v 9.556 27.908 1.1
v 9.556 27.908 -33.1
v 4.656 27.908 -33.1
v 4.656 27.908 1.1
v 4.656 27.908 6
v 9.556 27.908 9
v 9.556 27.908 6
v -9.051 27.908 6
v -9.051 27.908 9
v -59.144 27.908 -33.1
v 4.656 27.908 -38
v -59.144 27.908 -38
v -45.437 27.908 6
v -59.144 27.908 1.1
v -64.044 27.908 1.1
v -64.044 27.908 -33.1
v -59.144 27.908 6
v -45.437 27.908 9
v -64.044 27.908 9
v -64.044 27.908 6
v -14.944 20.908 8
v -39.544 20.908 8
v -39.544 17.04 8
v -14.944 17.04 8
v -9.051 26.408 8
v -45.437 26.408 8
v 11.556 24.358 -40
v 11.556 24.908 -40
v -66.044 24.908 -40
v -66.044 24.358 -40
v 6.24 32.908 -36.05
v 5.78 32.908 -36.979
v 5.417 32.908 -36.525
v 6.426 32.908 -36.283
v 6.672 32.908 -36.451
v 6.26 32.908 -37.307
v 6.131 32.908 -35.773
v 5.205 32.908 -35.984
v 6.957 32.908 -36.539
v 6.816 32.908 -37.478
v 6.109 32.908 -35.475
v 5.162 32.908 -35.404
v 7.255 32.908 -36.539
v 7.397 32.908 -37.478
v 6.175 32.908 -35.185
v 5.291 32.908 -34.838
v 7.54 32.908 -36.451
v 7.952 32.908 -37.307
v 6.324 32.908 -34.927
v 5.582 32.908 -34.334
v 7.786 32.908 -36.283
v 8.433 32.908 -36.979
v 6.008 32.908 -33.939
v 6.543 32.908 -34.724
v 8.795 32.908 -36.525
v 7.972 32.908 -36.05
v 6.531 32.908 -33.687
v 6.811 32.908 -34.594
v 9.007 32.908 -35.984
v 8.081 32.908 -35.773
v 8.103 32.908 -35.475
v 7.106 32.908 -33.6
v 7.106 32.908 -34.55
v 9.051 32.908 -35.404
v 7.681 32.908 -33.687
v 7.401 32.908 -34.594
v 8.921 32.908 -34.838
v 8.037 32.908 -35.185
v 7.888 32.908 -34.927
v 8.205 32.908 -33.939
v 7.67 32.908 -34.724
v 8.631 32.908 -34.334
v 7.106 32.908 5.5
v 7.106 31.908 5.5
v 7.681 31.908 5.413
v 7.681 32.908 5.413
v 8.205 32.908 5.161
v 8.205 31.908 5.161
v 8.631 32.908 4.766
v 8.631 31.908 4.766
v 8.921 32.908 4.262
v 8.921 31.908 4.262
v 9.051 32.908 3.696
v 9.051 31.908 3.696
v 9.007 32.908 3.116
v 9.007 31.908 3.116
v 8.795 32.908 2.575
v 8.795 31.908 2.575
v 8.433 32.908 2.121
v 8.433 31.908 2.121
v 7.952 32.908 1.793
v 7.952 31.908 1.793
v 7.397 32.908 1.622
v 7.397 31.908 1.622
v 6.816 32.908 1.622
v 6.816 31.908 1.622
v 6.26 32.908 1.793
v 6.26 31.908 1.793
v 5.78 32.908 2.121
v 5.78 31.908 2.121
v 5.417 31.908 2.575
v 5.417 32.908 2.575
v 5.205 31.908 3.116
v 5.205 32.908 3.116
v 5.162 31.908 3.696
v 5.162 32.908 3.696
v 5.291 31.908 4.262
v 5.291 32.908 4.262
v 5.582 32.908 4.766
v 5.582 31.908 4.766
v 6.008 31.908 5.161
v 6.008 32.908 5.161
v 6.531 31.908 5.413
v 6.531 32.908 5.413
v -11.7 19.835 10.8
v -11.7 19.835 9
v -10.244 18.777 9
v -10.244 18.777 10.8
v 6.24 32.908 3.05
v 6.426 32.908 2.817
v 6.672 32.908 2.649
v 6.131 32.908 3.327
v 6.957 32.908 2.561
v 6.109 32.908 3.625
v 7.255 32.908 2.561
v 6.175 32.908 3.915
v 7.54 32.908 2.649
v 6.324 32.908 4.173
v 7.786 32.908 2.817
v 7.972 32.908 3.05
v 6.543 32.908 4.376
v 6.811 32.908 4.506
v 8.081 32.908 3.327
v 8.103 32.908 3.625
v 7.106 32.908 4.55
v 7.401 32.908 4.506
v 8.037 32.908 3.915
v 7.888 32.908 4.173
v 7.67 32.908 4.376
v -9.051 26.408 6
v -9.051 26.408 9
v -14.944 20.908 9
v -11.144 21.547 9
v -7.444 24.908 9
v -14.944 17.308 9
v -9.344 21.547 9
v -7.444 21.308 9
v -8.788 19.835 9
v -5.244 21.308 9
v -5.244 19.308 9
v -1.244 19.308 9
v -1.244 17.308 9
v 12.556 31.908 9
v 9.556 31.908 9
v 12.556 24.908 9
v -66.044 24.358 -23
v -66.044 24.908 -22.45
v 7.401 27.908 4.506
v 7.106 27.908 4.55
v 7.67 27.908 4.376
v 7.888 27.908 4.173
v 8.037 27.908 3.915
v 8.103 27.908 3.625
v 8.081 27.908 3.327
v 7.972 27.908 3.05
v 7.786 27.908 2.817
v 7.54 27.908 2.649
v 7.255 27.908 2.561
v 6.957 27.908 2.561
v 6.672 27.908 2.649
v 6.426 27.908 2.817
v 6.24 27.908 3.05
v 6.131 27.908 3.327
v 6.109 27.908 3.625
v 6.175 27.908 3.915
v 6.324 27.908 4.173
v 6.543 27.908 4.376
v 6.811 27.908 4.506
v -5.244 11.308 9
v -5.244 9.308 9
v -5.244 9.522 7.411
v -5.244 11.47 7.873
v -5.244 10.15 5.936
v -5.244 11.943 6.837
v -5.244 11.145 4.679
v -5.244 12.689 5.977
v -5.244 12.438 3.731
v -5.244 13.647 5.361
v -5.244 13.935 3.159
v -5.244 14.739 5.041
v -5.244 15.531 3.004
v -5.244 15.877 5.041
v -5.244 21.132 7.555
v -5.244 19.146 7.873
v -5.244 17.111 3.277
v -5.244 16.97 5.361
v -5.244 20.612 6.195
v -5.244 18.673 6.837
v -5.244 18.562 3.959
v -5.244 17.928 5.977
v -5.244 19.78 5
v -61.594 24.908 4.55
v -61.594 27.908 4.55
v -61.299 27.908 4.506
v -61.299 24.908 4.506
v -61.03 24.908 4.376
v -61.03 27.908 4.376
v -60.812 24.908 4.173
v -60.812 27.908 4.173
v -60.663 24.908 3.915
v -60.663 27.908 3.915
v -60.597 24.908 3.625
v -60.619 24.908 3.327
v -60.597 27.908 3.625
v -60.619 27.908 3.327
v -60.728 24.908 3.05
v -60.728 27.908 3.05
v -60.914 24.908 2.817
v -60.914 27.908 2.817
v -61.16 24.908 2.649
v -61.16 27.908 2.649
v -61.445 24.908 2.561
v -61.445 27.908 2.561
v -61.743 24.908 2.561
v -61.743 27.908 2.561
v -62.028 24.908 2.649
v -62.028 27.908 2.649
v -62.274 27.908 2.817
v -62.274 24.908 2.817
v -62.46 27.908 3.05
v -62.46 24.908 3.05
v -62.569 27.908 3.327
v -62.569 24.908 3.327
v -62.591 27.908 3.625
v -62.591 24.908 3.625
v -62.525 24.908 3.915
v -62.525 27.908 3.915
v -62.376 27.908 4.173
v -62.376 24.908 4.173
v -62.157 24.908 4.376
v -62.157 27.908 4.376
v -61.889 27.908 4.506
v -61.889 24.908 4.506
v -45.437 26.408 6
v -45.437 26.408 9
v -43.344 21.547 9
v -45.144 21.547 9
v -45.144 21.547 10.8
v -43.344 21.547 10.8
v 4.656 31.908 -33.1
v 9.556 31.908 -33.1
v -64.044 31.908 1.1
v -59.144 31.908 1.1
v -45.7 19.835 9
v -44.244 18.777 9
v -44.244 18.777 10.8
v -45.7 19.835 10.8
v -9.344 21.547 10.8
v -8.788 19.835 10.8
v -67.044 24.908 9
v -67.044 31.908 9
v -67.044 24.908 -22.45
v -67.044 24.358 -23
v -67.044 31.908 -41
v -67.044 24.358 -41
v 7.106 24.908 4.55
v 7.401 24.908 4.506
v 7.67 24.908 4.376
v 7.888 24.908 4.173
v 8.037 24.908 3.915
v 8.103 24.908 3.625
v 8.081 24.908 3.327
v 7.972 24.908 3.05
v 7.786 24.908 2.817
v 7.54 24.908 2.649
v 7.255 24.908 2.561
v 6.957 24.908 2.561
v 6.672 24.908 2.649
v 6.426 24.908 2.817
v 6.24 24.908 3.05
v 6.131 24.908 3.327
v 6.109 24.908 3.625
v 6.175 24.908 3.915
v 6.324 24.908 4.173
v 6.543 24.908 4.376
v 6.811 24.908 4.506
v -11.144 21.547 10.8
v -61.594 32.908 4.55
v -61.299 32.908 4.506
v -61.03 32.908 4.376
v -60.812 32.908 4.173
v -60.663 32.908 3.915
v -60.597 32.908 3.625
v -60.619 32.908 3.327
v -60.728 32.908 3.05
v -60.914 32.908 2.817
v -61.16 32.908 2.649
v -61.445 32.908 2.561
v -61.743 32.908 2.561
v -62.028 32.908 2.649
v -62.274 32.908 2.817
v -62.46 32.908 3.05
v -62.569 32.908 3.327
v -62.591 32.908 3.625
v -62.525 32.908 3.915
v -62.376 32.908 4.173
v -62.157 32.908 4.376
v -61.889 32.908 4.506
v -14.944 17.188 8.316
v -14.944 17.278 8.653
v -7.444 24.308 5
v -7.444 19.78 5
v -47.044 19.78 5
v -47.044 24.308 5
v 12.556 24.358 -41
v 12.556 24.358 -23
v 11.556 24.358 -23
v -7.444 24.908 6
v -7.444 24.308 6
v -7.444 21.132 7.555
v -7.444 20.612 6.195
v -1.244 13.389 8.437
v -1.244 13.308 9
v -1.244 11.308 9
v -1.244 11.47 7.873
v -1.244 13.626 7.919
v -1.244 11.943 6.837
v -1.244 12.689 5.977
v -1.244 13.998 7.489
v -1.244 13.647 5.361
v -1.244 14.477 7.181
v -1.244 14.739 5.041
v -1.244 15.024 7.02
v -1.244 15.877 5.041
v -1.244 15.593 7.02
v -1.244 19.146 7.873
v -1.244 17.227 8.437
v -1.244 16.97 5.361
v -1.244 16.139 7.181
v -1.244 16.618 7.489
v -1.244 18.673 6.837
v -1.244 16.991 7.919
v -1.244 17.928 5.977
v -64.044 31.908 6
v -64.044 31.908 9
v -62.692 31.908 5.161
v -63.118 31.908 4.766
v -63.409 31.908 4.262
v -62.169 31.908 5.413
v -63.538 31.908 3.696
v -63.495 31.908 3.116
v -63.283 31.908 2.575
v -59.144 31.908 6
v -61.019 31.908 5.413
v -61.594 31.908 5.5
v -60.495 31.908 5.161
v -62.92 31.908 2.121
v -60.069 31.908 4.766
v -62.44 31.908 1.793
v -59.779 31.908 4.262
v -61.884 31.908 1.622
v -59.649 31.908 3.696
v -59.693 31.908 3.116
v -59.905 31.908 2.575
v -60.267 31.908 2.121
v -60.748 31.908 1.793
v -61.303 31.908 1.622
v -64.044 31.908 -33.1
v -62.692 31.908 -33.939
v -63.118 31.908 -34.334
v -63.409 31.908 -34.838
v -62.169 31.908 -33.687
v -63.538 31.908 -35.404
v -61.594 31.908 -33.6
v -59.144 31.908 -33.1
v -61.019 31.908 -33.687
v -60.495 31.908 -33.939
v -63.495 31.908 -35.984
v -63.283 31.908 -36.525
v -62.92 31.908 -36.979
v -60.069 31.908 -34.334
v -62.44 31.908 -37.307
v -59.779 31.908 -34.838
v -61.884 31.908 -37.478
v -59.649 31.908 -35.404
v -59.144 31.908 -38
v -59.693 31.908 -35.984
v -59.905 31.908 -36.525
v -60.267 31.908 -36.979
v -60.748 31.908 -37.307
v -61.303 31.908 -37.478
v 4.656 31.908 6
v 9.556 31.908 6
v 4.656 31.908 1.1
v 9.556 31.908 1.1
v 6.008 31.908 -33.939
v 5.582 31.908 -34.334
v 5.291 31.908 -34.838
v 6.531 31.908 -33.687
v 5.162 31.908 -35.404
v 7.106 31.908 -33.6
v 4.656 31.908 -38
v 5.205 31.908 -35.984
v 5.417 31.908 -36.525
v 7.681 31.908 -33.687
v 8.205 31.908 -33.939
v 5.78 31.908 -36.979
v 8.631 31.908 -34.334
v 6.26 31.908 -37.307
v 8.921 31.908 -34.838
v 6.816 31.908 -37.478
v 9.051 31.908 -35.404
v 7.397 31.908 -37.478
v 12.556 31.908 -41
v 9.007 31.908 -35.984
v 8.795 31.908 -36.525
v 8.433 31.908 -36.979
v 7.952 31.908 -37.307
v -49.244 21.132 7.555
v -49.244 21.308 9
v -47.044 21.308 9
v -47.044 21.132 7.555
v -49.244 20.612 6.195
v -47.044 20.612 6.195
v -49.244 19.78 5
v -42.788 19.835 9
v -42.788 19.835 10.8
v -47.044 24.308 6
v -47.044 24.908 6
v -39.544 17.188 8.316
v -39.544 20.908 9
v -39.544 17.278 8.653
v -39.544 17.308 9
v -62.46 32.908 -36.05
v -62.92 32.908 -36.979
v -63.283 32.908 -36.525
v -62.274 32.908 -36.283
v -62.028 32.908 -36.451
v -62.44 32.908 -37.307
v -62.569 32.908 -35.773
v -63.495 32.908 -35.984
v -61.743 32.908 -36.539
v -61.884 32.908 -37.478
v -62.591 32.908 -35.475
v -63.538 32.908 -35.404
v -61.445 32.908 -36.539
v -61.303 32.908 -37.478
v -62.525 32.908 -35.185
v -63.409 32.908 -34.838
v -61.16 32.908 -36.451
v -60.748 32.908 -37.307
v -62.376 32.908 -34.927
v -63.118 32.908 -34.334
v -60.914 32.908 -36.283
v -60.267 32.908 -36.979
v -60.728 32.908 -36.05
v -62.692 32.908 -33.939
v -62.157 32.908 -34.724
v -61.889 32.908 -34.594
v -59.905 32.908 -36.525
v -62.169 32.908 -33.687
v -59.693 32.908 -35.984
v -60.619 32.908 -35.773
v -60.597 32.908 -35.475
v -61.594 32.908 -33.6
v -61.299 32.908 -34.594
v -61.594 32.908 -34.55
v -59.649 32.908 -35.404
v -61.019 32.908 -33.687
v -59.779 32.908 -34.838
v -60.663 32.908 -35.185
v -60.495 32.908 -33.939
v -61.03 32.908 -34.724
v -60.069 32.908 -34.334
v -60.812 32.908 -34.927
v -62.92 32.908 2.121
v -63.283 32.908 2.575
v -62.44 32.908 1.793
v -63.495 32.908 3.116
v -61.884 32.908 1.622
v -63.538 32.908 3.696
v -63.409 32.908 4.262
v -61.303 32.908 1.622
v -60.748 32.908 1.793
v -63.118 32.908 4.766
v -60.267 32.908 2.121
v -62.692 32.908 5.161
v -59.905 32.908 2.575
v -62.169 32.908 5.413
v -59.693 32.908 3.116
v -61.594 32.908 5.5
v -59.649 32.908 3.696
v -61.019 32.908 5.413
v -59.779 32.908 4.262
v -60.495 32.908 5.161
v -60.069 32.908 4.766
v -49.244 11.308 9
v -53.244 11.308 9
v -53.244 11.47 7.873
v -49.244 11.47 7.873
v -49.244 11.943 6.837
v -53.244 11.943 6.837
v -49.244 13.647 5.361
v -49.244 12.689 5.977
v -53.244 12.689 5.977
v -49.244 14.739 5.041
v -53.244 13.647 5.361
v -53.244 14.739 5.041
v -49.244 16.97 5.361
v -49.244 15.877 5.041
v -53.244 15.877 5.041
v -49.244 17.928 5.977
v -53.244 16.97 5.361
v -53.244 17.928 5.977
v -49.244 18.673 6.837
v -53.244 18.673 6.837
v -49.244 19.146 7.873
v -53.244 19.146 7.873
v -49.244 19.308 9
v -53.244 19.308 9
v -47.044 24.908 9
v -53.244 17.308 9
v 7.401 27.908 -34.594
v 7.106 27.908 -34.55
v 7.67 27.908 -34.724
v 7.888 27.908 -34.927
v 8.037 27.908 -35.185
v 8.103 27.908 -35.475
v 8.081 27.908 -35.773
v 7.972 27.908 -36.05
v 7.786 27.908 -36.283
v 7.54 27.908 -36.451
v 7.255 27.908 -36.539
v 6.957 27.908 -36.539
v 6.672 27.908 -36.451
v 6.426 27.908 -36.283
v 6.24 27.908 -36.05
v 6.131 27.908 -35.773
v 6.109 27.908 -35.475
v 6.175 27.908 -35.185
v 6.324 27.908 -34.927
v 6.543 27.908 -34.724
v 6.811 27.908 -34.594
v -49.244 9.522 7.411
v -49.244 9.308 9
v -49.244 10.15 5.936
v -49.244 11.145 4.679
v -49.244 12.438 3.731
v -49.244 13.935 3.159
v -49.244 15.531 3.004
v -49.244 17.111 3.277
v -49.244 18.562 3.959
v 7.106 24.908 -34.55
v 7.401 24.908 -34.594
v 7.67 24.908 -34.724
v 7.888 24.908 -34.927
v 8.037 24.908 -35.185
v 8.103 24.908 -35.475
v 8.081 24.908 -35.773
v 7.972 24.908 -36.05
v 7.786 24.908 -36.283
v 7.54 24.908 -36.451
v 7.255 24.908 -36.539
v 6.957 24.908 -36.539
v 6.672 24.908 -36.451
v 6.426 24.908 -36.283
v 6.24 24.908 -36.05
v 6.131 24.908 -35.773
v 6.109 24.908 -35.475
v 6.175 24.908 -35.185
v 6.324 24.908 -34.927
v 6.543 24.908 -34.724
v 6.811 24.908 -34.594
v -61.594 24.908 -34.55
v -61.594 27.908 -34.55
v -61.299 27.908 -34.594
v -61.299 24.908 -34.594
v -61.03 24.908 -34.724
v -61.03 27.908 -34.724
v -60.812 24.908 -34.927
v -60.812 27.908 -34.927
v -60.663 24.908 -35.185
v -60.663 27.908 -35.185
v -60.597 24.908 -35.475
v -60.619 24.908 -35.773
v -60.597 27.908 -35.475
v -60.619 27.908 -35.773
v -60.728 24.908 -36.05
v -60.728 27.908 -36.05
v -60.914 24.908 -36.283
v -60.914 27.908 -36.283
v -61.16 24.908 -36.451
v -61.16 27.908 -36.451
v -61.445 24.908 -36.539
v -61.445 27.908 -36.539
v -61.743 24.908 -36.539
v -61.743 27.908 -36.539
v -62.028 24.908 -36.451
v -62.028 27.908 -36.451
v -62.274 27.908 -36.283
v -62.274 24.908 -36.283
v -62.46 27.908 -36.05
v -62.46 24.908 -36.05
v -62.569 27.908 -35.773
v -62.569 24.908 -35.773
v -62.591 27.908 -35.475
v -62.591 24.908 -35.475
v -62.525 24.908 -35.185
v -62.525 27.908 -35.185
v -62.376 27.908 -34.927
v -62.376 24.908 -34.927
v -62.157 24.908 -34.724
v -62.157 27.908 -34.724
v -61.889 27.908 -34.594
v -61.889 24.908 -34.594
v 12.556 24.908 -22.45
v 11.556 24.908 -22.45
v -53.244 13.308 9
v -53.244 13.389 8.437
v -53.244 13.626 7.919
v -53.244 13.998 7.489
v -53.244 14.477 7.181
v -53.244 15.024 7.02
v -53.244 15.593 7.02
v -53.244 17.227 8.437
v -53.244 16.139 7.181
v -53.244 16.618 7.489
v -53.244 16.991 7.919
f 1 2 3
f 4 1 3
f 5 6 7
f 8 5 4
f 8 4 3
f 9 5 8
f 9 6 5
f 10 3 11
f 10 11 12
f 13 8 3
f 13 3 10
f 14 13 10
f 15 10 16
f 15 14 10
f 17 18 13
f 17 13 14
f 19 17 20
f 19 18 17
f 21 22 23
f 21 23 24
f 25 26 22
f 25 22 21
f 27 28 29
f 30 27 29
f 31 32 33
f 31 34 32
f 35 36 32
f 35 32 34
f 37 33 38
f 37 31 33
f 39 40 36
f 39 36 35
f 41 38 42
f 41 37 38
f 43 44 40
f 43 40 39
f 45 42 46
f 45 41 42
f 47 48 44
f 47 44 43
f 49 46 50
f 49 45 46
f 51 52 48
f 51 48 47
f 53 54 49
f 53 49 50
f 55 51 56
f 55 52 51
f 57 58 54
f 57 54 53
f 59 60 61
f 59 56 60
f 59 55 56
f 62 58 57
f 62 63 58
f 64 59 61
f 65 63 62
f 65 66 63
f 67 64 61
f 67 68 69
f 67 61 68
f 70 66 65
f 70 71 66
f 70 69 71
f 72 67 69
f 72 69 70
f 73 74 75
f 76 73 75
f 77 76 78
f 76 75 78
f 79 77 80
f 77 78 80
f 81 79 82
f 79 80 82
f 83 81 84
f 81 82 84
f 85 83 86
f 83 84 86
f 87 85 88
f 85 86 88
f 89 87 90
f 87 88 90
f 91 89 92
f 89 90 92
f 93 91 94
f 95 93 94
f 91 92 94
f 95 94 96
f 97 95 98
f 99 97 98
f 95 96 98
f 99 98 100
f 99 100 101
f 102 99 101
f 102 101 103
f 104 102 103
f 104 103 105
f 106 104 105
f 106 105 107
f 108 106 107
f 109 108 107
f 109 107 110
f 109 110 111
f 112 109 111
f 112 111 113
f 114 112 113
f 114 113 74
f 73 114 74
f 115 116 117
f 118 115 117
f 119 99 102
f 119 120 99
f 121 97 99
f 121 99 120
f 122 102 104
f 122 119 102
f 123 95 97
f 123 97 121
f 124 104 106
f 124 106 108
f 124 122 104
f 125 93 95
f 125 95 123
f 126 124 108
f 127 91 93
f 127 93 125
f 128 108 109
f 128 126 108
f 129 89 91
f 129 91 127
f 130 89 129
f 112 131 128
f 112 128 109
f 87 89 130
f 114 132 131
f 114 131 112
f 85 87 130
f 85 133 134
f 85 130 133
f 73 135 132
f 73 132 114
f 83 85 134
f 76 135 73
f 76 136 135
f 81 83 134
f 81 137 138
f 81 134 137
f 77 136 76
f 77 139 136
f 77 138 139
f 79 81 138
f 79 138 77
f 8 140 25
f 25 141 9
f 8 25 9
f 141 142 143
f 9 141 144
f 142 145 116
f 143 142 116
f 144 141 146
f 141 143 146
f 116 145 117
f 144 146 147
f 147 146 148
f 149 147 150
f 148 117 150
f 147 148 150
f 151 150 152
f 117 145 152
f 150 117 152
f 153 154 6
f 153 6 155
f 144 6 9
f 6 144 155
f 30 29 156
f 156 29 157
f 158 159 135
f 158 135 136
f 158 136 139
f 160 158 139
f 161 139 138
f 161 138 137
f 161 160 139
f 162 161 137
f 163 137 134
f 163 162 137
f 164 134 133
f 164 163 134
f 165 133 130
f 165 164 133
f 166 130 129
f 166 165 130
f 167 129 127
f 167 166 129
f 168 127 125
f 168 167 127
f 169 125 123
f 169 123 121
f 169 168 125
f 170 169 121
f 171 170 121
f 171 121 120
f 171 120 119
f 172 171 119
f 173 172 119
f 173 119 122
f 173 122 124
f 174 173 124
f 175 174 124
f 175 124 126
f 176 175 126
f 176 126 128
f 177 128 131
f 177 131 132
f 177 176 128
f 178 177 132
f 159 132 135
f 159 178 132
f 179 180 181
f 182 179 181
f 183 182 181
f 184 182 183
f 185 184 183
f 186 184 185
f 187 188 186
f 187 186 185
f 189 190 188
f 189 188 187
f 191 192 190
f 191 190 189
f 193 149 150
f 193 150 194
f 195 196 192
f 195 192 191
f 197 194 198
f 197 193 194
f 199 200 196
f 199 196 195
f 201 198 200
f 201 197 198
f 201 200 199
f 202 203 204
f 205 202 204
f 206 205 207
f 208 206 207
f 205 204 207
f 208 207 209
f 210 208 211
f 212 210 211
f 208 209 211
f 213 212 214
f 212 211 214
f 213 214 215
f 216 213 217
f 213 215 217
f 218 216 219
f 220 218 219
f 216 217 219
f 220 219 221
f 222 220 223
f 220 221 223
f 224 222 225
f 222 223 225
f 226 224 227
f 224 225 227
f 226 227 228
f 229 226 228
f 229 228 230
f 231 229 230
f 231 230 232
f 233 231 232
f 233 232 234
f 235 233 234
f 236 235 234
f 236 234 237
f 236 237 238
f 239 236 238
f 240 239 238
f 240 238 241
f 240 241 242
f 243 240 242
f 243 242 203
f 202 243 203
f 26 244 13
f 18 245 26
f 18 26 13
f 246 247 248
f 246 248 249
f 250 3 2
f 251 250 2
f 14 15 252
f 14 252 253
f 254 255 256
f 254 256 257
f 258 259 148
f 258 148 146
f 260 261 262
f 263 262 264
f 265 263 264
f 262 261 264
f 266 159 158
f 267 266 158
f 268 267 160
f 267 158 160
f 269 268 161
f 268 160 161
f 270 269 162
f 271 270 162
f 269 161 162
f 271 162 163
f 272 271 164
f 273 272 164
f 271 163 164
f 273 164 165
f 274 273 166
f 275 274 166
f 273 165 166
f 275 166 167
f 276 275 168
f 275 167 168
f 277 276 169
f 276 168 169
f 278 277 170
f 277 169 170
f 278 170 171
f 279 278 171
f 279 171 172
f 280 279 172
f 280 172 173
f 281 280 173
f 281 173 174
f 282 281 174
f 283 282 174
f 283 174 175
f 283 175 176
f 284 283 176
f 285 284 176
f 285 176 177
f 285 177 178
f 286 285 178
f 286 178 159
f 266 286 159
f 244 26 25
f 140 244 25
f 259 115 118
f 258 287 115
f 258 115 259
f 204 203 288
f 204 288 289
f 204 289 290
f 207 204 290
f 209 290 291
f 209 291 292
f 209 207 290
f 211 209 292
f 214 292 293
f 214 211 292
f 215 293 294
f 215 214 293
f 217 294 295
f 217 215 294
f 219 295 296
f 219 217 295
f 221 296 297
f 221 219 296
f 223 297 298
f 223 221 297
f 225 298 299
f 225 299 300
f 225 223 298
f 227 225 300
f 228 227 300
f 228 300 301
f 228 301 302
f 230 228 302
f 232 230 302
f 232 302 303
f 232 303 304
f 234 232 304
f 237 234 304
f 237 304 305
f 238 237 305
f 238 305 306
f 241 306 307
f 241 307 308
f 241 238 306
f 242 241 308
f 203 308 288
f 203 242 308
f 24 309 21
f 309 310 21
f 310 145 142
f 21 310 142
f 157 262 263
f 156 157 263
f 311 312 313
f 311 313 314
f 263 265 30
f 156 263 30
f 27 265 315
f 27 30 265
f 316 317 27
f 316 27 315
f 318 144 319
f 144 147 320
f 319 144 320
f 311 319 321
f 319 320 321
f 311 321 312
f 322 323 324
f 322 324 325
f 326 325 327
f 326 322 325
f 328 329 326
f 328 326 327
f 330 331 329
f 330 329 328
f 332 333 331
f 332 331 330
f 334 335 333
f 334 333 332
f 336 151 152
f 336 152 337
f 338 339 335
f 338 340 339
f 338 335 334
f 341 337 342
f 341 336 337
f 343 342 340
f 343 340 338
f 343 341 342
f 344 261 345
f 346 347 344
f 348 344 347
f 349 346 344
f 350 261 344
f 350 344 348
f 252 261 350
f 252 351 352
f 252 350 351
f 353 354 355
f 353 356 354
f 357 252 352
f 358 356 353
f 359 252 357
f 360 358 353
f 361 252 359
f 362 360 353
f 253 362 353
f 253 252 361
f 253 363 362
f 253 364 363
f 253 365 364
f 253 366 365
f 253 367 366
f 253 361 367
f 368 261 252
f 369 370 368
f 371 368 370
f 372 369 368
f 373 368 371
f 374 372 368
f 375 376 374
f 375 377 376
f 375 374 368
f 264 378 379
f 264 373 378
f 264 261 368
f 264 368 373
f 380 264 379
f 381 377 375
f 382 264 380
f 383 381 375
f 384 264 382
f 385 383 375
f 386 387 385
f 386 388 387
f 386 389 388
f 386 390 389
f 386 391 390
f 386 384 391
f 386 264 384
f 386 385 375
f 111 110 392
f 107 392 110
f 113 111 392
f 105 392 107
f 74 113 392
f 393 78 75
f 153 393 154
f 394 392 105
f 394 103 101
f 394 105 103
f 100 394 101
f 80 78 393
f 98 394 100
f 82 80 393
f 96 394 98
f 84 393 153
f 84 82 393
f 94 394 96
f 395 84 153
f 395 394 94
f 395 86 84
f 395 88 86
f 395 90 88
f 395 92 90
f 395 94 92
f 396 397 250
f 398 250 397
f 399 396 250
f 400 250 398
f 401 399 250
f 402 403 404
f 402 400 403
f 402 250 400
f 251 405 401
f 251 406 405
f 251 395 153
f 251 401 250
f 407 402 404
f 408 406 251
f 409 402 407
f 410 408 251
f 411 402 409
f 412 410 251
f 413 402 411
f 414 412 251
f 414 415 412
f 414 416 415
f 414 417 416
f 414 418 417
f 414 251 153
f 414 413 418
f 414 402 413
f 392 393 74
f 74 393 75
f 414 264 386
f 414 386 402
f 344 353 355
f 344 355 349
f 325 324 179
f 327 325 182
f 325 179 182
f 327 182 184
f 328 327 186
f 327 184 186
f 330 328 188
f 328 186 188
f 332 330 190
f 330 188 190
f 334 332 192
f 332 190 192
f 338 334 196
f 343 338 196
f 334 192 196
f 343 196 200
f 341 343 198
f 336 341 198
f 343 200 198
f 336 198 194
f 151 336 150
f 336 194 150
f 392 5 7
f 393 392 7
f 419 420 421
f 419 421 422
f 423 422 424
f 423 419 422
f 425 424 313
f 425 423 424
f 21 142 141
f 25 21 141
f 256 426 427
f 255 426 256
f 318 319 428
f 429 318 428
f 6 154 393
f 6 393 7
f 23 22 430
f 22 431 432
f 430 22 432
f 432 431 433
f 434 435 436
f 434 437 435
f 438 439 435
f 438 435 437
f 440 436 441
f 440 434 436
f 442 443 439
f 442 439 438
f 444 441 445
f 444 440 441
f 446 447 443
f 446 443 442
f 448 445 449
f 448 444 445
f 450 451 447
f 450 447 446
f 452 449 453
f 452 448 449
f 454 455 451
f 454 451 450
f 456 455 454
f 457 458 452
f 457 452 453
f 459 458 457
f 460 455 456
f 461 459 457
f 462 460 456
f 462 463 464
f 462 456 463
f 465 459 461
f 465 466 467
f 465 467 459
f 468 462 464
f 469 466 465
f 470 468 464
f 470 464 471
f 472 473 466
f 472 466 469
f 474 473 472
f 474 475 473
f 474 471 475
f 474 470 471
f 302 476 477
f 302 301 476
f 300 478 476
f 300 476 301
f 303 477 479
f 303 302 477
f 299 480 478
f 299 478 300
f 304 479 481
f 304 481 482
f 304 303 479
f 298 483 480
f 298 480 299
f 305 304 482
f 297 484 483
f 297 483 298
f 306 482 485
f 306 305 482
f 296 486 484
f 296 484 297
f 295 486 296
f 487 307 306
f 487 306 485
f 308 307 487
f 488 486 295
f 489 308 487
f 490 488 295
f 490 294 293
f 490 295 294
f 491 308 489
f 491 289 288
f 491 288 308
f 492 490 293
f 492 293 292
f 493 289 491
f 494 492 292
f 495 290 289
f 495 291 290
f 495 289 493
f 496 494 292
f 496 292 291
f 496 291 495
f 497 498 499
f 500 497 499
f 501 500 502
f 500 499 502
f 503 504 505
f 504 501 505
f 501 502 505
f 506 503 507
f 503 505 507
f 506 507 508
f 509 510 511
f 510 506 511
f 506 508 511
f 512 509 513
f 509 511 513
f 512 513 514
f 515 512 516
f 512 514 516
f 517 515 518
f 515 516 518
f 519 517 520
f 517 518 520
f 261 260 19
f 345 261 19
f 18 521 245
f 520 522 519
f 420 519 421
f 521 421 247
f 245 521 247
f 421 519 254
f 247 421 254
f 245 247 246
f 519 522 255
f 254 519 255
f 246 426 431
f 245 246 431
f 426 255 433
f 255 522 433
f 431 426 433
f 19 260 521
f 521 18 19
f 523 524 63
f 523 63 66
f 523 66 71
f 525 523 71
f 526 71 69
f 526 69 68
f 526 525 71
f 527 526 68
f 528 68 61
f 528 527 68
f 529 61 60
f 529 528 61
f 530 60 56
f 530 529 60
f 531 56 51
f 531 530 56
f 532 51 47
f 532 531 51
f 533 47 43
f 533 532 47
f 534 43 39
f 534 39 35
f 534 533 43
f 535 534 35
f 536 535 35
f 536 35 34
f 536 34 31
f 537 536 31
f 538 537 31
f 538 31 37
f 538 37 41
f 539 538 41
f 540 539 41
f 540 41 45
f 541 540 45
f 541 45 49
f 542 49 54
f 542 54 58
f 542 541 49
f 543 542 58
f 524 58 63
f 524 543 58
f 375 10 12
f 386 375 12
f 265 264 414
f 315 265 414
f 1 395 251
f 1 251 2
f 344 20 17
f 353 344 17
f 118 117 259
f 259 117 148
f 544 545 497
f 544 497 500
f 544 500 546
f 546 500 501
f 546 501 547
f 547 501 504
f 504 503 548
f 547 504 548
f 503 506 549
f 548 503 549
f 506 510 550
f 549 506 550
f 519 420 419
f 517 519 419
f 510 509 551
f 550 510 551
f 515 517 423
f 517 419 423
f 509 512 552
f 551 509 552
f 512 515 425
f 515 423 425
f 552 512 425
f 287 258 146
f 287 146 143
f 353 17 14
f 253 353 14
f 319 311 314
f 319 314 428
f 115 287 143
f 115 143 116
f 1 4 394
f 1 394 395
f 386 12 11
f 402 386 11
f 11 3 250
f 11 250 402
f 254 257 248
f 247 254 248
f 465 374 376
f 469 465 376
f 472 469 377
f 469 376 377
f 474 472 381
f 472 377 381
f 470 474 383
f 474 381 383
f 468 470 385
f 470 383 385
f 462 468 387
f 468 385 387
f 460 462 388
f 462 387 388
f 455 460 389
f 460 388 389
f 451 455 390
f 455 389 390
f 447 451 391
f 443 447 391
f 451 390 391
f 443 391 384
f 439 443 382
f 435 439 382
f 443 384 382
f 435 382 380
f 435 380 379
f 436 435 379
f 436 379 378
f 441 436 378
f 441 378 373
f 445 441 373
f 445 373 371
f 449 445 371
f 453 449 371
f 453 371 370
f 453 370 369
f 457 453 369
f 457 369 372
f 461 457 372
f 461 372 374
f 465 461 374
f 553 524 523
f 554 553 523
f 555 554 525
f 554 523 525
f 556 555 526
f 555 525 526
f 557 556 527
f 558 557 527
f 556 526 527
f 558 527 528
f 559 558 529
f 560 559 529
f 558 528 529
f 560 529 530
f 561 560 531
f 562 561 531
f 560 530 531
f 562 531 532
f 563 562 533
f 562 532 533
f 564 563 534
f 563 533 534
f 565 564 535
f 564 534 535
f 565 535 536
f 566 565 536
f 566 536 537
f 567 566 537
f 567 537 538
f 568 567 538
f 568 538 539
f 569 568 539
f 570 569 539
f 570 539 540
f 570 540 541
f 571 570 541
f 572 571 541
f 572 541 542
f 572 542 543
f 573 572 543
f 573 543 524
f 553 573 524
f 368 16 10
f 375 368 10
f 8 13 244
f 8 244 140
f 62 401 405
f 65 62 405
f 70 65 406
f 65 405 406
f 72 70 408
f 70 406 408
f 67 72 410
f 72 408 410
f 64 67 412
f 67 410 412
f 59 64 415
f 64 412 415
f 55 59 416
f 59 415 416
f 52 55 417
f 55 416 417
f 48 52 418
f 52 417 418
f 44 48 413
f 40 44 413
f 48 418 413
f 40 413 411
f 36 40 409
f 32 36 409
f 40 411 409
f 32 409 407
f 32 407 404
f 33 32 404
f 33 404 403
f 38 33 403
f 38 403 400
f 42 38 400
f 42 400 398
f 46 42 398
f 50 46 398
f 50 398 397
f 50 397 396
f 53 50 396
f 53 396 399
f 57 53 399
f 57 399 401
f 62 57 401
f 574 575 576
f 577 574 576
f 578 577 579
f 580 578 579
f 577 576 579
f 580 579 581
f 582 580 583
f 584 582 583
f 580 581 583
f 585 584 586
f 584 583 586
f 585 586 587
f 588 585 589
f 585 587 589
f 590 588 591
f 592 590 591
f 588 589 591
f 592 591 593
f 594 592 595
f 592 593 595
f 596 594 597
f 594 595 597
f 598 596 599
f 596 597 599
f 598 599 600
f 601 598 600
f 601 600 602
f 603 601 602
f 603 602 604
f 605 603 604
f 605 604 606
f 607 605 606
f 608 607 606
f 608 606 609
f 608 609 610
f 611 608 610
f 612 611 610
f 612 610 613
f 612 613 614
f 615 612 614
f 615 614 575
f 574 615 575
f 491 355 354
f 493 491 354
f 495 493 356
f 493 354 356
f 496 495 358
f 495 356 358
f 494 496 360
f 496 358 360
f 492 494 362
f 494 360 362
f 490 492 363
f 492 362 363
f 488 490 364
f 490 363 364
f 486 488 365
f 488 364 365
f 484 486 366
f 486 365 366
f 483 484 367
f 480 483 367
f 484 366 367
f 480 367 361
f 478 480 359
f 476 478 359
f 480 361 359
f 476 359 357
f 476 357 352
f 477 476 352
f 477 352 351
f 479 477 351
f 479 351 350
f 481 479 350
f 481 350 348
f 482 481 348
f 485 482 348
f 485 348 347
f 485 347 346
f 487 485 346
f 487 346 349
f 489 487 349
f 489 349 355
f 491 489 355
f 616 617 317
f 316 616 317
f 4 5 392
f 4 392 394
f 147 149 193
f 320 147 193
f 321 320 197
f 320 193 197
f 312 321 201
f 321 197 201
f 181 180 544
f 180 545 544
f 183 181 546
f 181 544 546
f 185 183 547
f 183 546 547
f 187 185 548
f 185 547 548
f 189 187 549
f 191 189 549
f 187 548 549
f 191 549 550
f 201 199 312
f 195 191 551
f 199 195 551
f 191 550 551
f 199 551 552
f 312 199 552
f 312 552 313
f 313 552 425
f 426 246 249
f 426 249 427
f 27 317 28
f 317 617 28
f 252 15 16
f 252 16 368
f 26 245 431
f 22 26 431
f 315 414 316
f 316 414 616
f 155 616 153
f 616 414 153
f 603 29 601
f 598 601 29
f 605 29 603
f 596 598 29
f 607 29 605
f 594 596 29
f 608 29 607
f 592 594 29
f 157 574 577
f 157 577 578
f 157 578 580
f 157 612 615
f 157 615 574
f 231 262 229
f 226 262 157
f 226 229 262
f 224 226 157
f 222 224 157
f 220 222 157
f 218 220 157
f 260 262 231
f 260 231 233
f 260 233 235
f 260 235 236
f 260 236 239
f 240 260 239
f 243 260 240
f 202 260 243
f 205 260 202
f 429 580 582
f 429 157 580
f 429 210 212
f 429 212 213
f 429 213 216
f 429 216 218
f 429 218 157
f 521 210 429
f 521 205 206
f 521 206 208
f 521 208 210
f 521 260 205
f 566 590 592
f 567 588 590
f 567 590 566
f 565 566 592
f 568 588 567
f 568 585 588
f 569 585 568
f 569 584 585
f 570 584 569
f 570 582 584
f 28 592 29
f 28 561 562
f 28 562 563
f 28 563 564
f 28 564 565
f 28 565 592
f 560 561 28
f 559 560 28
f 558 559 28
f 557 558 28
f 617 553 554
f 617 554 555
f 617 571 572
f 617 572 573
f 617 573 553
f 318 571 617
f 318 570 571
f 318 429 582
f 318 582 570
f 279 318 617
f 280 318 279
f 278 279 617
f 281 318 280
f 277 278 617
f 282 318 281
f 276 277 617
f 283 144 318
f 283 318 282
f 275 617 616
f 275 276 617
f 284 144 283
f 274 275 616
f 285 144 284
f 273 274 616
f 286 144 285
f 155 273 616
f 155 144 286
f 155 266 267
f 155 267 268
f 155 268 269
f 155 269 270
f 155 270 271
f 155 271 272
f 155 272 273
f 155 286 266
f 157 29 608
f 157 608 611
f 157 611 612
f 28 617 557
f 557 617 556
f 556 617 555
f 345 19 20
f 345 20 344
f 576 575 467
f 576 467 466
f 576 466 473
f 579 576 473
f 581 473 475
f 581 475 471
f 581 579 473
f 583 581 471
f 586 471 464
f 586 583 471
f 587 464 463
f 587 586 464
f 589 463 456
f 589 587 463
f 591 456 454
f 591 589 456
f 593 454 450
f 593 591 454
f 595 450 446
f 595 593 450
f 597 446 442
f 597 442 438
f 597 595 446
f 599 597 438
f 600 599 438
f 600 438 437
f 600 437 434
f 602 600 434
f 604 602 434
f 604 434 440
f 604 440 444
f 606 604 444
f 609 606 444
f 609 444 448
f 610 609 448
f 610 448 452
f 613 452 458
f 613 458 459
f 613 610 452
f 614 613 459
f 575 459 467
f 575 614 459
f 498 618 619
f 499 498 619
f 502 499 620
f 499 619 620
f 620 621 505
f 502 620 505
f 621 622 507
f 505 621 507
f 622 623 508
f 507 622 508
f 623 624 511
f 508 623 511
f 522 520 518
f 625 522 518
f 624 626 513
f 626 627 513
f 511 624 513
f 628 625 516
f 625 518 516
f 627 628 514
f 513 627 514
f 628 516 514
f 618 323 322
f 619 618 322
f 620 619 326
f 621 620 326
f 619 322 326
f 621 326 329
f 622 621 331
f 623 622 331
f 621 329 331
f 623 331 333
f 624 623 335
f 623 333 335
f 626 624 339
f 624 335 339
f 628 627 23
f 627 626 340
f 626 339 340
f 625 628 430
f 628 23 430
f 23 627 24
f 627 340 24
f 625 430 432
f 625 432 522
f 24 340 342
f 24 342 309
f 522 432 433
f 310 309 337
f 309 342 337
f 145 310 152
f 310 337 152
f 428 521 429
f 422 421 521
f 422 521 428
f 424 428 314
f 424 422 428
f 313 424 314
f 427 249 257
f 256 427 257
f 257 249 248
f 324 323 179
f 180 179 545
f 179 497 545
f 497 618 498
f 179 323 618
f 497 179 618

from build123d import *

# Parameters (mm, degrees)
IZIM2_W                          = 40
IZIM2_H                          = 16
Y_KSEKLIK_EKSTR_ZYON4_DEPTH      = 9
Y_KSEKLIK_EKSTR_ZYON5_DEPTH      = 2
Y_KSEKLIK_EKSTR_ZYON5_DEPTH_BACK = 42
Y_KSEKLIK_EKSTR_ZYON6_DEPTH      = 6
Y_KSEKLIK_EKSTR_ZYON6_DEPTH_BACK = 46
KES_EKSTR_ZYON1_DEPTH            = 52
KES_EKSTR_ZYON2_DEPTH            = 53.347615077
KES_EKSTR_ZYON2_DEPTH_BACK       = 52
IZIM3_4_W                        = 9
IZIM3_4_H                        = 16
Y_KSEKLIK_EKSTR_ZYON7_DEPTH      = 44
KES_EKSTR_ZYON4_DEPTH            = 44
KES_EKSTR_ZYON8_DEPTH            = 2.2
KES_EKSTR_ZYON9_DEPTH            = 2.2
IZIM14_W                         = 39.6
IZIM14_H                         = 3
ARALIK_EKS_DEPTH                 = 0.6
Y_KSEKLIK_EKSTR_ZYON9_DEPTH      = 7
Y_KSEKLIK_EKSTR_ZYON11_DEPTH     = 47
IZIM17_W                         = 73.6
IZIM17_H                         = 4
KES_EKSTR_ZYON10_DEPTH           = 10
IZIM18_W                         = 4.9
IZIM18_H                         = 4.9
IZIM18_R                         = 1.95
Y_KSEKLIK_EKSTR_ZYON12_DEPTH     = 4
IZIM18_3_R                       = 1.95
IZIM18_3_R_2                     = 1
Y_KSEKLIK_EKSTR_ZYON13_DEPTH     = 5
IZIM18_4_R                       = 1
KES_EKSTR_ZYON11_DEPTH           = 7
KES_EKSTR_ZYON12_DEPTH           = 1
IZIM21_W                         = 36.385714286
IZIM21_H                         = 1.5
KES_EKSTR_ZYON13_DEPTH           = 3
Y_KSEKLIK_EKSTR_ZYON14_DEPTH     = 1.8
Y_KSEKLIK_EKSTR_ZYON15_DEPTH     = 0.55
PAH1_SIZE                        = 1


with BuildPart() as part:
    # Çizim2 → Yükseklik-Ekstrüzyon4 (new body)
    with BuildSketch(Plane.XY):
        with Locations((-27.243761407, 15.308213235)):
            Rectangle(IZIM2_W, IZIM2_H)
    extrude(amount=Y_KSEKLIK_EKSTR_ZYON4_DEPTH)

    # Çizim3 → Yükseklik-Ekstrüzyon5 (add, two sides: drawn at the far end of the back side and taken through both)
    with BuildSketch(Plane(origin=(-7.243761407, 0, 0), x_dir=(0, 0, -1), z_dir=(1, 0, 0)).offset(-Y_KSEKLIK_EKSTR_ZYON5_DEPTH_BACK)):
        with BuildLine():
            ThreePointArc((-9, 9.308213235), (-3, 15.308213235), (-9, 21.308213235))
            Line((-9, 21.308213235), (-9, 19.308213235))
            ThreePointArc((-9, 19.308213235), (-5, 15.308213235), (-9, 11.308213235))
            Line((-9, 11.308213235), (-9, 9.308213235))
        make_face()
    extrude(amount=Y_KSEKLIK_EKSTR_ZYON5_DEPTH + Y_KSEKLIK_EKSTR_ZYON5_DEPTH_BACK)

    # Çizim3<3> → Yükseklik-Ekstrüzyon6 (add, two sides: drawn at the far end of the back side and taken through both)
    with BuildSketch(Plane(origin=(-7.243761407, 0, 0), x_dir=(0, 0, -1), z_dir=(1, 0, 0)).offset(-Y_KSEKLIK_EKSTR_ZYON6_DEPTH_BACK)):
        with BuildLine():
            ThreePointArc((-9, 11.308213235), (-5, 15.308213235), (-9, 19.308213235))
            Line((-9, 19.308213235), (-9, 11.308213235))
        make_face()
    extrude(amount=Y_KSEKLIK_EKSTR_ZYON6_DEPTH + Y_KSEKLIK_EKSTR_ZYON6_DEPTH_BACK)

    # Çizim4 → Kes-Ekstrüzyon1 (cut)
    with BuildSketch(Plane(origin=(-1.243761407, 0, 0), x_dir=(0, 0, -1), z_dir=(1, 0, 0))):
        with BuildLine():
            Line((-9, 17.308213235), (-9, 13.308213235))
            ThreePointArc((-9, 13.308213235), (-7, 15.308213235), (-9, 17.308213235))
        make_face()
    extrude(amount=-KES_EKSTR_ZYON1_DEPTH, mode=Mode.SUBTRACT)

    # Çizim3<4> → Kes-Ekstrüzyon2 (cut, two sides: drawn at the far end of the back side and taken through both)
    with BuildSketch(Plane(origin=(-7.243761407, 0, 0), x_dir=(0, 0, -1), z_dir=(1, 0, 0)).offset(-KES_EKSTR_ZYON2_DEPTH_BACK)):
        with Locations((-4.5, 15.308213235)):
            Rectangle(IZIM3_4_W, IZIM3_4_H)
        with BuildLine():
            ThreePointArc((-9, 9.308213235), (-3, 15.308213235), (-9, 21.308213235))
            Line((-9, 21.308213235), (-9, 9.308213235))
        make_face(mode=Mode.SUBTRACT)
    extrude(amount=KES_EKSTR_ZYON2_DEPTH + KES_EKSTR_ZYON2_DEPTH_BACK, mode=Mode.SUBTRACT)


with BuildPart() as kes_ekstr_zyon2_kept_piece:
    # of the separate pieces the step leaves, the one the design keeps (kes_ekstr_zyon2_pieces_kept)
    add(part.part.solids().sort_by_distance((-49.243761407, 9.308213235, 9))[0])

    # Çizim7 → Yükseklik-Ekstrüzyon7 (add)
    with BuildSketch(Plane(origin=(-5.243761407, 0, 0), x_dir=(0, 0, -1), z_dir=(1, 0, 0))):
        with BuildLine():
            Line((-5, 19.78034919), (-5, 24.308213235))
            Line((-5, 24.308213235), (-9, 24.308213235))
            Line((-9, 24.308213235), (-9, 21.308213235))
            ThreePointArc((-9, 21.308213235), (-6.859067461, 20.913247389), (-5, 19.78034919))
        make_face()
    extrude(amount=-Y_KSEKLIK_EKSTR_ZYON7_DEPTH)

    # Çizim8 → Kes-Ekstrüzyon4 (cut)
    with BuildSketch(Plane.XY.offset(9)):
        Polygon((-7.443761407, 24.308213235), (-7.443761407, 21.308213235), (-5.243761407, 21.308213235), (-5.243761407, 22.308213235), (-5.243761407, 24.308213235), align=None)
        Polygon((-49.243761407, 24.308213235), (-47.043761407, 24.308213235), (-47.043761407, 21.308213235), (-49.243761407, 21.308213235), (-49.243761407, 22.308213235), align=None)
    extrude(amount=-KES_EKSTR_ZYON4_DEPTH, mode=Mode.SUBTRACT)

    # Çizim7<3> → Kes-Ekstrüzyon8 (cut)
    with BuildSketch(Plane(origin=(-5.243761407, 0, 0), x_dir=(0, 0, -1), z_dir=(1, 0, 0))):
        with BuildLine():
            Line((-5, 19.78034919), (-5, 24.308213235))
            Line((-5, 24.308213235), (-9, 24.308213235))
            Line((-9, 24.308213235), (-9, 21.308213235))
            ThreePointArc((-9, 21.308213235), (-6.859067461, 20.913247389), (-5, 19.78034919))
        make_face()
    extrude(amount=-KES_EKSTR_ZYON8_DEPTH, mode=Mode.SUBTRACT)

    # Çizim12 → Kes-Ekstrüzyon9 (cut)
    with BuildSketch(Plane.ZY.offset(49.243761407)):
        with BuildLine():
            Line((5, 19.78034919), (5, 21.308213235))
            Line((5, 21.308213235), (9, 21.308213235))
            ThreePointArc((9, 21.308213235), (6.859067461, 20.913247389), (5, 19.78034919))
        make_face()
    extrude(amount=-KES_EKSTR_ZYON9_DEPTH, mode=Mode.SUBTRACT)

    # Çizim14 → aralik_eks (add)
    with BuildSketch(Plane(origin=(0, 24.308213235, 0), x_dir=(1, 0, 0), z_dir=(0, 1, 0))):
        with Locations((-27.243761407, -7.5)):
            Rectangle(IZIM14_W, IZIM14_H)
    extrude(amount=ARALIK_EKS_DEPTH)

    # Çizim15 → Yükseklik-Ekstrüzyon9 (add)
    with BuildSketch(Plane(origin=(0, 24.908213235, 0), x_dir=(1, 0, 0), z_dir=(0, 1, 0))):
        Polygon((-47.043761407, -6), (-67.043761407, -6), (-67.043761407, -9), (-47.043761407, -9), (-7.443761407, -9), (12.556238593, -9), (12.556238593, -6), (-7.443761407, -6), align=None)
    extrude(amount=Y_KSEKLIK_EKSTR_ZYON9_DEPTH)

    # Çizim16 → Yükseklik-Ekstrüzyon11 (add)
    with BuildSketch(Plane(origin=(0, 0, 6), x_dir=(-1, 0, 0), z_dir=(0, 0, -1))):
        Polygon((-12.556238593, 24.908213235), (-12.556238593, 31.908213235), (-9.556238593, 31.908213235), (-9.556238593, 27.908213235), (64.043761407, 27.908213235), (64.043761407, 31.908213235), (67.043761407, 31.908213235), (67.043761407, 24.908213235), align=None)
    extrude(amount=Y_KSEKLIK_EKSTR_ZYON11_DEPTH)

    # Çizim17 → Kes-Ekstrüzyon10 (cut)
    with BuildSketch(Plane(origin=(0, 0, 6), x_dir=(-1, 0, 0), z_dir=(0, 0, -1))):
        with Locations((27.243761407, 29.908213235)):
            Rectangle(IZIM17_W, IZIM17_H)
    extrude(amount=-KES_EKSTR_ZYON10_DEPTH, mode=Mode.SUBTRACT)

    # Çizim18 → Yükseklik-Ekstrüzyon12 (add)
    # profile 1 of 5: a face of its own
    with BuildSketch(Plane(origin=(0, 27.908213235, 0), x_dir=(1, 0, 0), z_dir=(0, 1, 0))):
        with Locations((7.106238593, 35.55)):
            Rectangle(IZIM18_W, IZIM18_H)
        with Locations(Location((7.106238593, 35.55, 0), (0, 0, 270))):
            Circle(IZIM18_R, mode=Mode.SUBTRACT)
    # profile 2 of 5: a face of its own
    with BuildSketch(Plane(origin=(0, 27.908213235, 0), x_dir=(1, 0, 0), z_dir=(0, 1, 0))):
        with Locations((-61.593761407, 35.55)):
            Rectangle(IZIM18_W, IZIM18_H)
        with Locations(Location((-61.593761407, 35.55, 0), (0, 0, 270))):
            Circle(IZIM18_R, mode=Mode.SUBTRACT)
    # profile 3 of 5: a face of its own
    with BuildSketch(Plane(origin=(0, 27.908213235, 0), x_dir=(1, 0, 0), z_dir=(0, 1, 0))):
        Polygon((9.556238593, 41), (-64.043761407, 41), (-64.043761407, 38), (-59.143761407, 38), (4.656238593, 38), (9.556238593, 38), align=None)
    # profile 4 of 5: a face of its own
    with BuildSketch(Plane(origin=(0, 27.908213235, 0), x_dir=(1, 0, 0), z_dir=(0, 1, 0))):
        with Locations((-61.593761407, -3.55)):
            Rectangle(IZIM18_W, IZIM18_H)
        with Locations(Location((-61.593761407, -3.55, 0), (0, 0, 270))):
            Circle(IZIM18_R, mode=Mode.SUBTRACT)
    # profile 5 of 5: a face of its own
    with BuildSketch(Plane(origin=(0, 27.908213235, 0), x_dir=(1, 0, 0), z_dir=(0, 1, 0))):
        with Locations((7.106238593, -3.55)):
            Rectangle(IZIM18_W, IZIM18_H)
        with Locations(Location((7.106238593, -3.55, 0), (0, 0, 270))):
            Circle(IZIM18_R, mode=Mode.SUBTRACT)
    extrude(amount=Y_KSEKLIK_EKSTR_ZYON12_DEPTH)

    # Çizim18<3> → Yükseklik-Ekstrüzyon13 (add)
    # profile 1 of 4: a face of its own
    with BuildSketch(Plane(origin=(0, 27.908213235, 0), x_dir=(1, 0, 0), z_dir=(0, 1, 0))):
        with Locations(Location((-61.593761407, 35.55, 0), (0, 0, 270))):
            Circle(IZIM18_3_R)
        with Locations(Location((-61.593761407, 35.55, 0), (0, 0, 270))):
            Circle(IZIM18_3_R_2, mode=Mode.SUBTRACT)
    # profile 2 of 4: a face of its own
    with BuildSketch(Plane(origin=(0, 27.908213235, 0), x_dir=(1, 0, 0), z_dir=(0, 1, 0))):
        with Locations(Location((7.106238593, 35.55, 0), (0, 0, 270))):
            Circle(IZIM18_3_R)
        with Locations(Location((7.106238593, 35.55, 0), (0, 0, 270))):
            Circle(IZIM18_3_R_2, mode=Mode.SUBTRACT)
    # profile 3 of 4: a face of its own
    with BuildSketch(Plane(origin=(0, 27.908213235, 0), x_dir=(1, 0, 0), z_dir=(0, 1, 0))):
        with Locations(Location((7.106238593, -3.55, 0), (0, 0, 270))):
            Circle(IZIM18_3_R)
        with Locations(Location((7.106238593, -3.55, 0), (0, 0, 270))):
            Circle(IZIM18_3_R_2, mode=Mode.SUBTRACT)
    # profile 4 of 4: a face of its own
    with BuildSketch(Plane(origin=(0, 27.908213235, 0), x_dir=(1, 0, 0), z_dir=(0, 1, 0))):
        with Locations(Location((-61.593761407, -3.55, 0), (0, 0, 270))):
            Circle(IZIM18_3_R)
        with Locations(Location((-61.593761407, -3.55, 0), (0, 0, 270))):
            Circle(IZIM18_3_R_2, mode=Mode.SUBTRACT)
    extrude(amount=Y_KSEKLIK_EKSTR_ZYON13_DEPTH)

    # Çizim18<4> → Kes-Ekstrüzyon11 (cut)
    with BuildSketch(Plane(origin=(0, 27.908213235, 0), x_dir=(1, 0, 0), z_dir=(0, 1, 0))):
        with Locations(Location((-61.593761407, -3.55, 0), (0, 0, 270))):
            Circle(IZIM18_4_R)
        with Locations(Location((-61.593761407, 35.55, 0), (0, 0, 270))):
            Circle(IZIM18_4_R)
        with Locations(Location((7.106238593, 35.55, 0), (0, 0, 270))):
            Circle(IZIM18_4_R)
        with Locations(Location((7.106238593, -3.55, 0), (0, 0, 270))):
            Circle(IZIM18_4_R)
    extrude(amount=-KES_EKSTR_ZYON11_DEPTH, mode=Mode.SUBTRACT)

    # Çizim19 → Kes-Ekstrüzyon12 (cut)
    with BuildSketch(Plane.XY.offset(9)):
        Polygon((-45.43661855, 26.408213235), (-39.543761407, 20.908213235), (-39.543761407, 15.034084551), (-14.943761407, 15.034084551), (-14.943761407, 20.908213235), (-9.050904264, 26.408213235), align=None)
    extrude(amount=-KES_EKSTR_ZYON12_DEPTH, mode=Mode.SUBTRACT)

    # Çizim21 → Kes-Ekstrüzyon13 (cut)
    with BuildSketch(Plane.XY.offset(9)):
        with Locations((-27.243761407, 27.158213235)):
            Rectangle(IZIM21_W, IZIM21_H)
    extrude(amount=-KES_EKSTR_ZYON13_DEPTH, mode=Mode.SUBTRACT)

    # Çizim22 → Yükseklik-Ekstrüzyon14 (add)
    with BuildSketch(Plane.XY.offset(9)):
        Polygon((-44.243761407, 18.77704178), (-45.699991997, 19.835055235), (-45.143761407, 21.546956964), (-43.343761407, 21.546956964), (-42.787530817, 19.835055235), align=None)
        Polygon((-11.143761407, 21.546956964), (-11.699991997, 19.835055235), (-10.243761407, 18.77704178), (-8.787530817, 19.835055235), (-9.343761407, 21.546956964), align=None)
    extrude(amount=Y_KSEKLIK_EKSTR_ZYON14_DEPTH)

    # Çizim23 → Yükseklik-Ekstrüzyon15 (add)
    with BuildSketch(Plane.XZ.offset(-24.908213235)):
        Polygon((-67.043761407, -41), (12.556238593, -41), (12.556238593, -22), (11.556238593, -22), (11.556238593, -40), (-66.043761407, -40), (-66.043761407, -22), (-67.043761407, -22), align=None)
    extrude(amount=Y_KSEKLIK_EKSTR_ZYON15_DEPTH)

    # Pah1
    # the kernel refuses this chamfer: 1 mm, written as the material it takes off along each edge
    with BuildSketch(Plane(origin=(15.127921581, 24.358213235, -22), x_dir=(0, 0.9996219169112968, 0.027495876610585647), z_dir=(-1, 0, 0))) as pah1_piece_1_section:
        Polygon((PAH1_SIZE * 0.999621916911, PAH1_SIZE * 0.0274958766106), (-PAH1_SIZE * 0.0274958766106, PAH1_SIZE * 0.999621916911), (0, 0), align=None)
    pah1_piece_1 = extrude(amount=6.143365976, mode=Mode.PRIVATE)
    pah1_piece_1 = split(pah1_piece_1, bisect_by=Plane(origin=(12.056238593, 24.908213235, -22.383932074), z_dir=(0, -1, 0)), keep=Keep.TOP, mode=Mode.PRIVATE)
    add(pah1_piece_1, mode=Mode.SUBTRACT)
    with BuildSketch(Plane(origin=(-63.472078419, 24.358213235, -22), x_dir=(0, 0.9996219169112968, 0.027495876610585647), z_dir=(-1, 0, 0))) as pah1_piece_2_section:
        Polygon((PAH1_SIZE * 0.999621916911, PAH1_SIZE * 0.0274958766106), (-PAH1_SIZE * 0.0274958766106, PAH1_SIZE * 0.999621916911), (0, 0), align=None)
    pah1_piece_2 = extrude(amount=6.143365976, mode=Mode.PRIVATE)
    pah1_piece_2 = split(pah1_piece_2, bisect_by=Plane(origin=(-66.543761407, 24.908213235, -22.383932074), z_dir=(0, -1, 0)), keep=Keep.TOP, mode=Mode.PRIVATE)
    add(pah1_piece_2, mode=Mode.SUBTRACT)


solid = kes_ekstr_zyon2_kept_piece.part
